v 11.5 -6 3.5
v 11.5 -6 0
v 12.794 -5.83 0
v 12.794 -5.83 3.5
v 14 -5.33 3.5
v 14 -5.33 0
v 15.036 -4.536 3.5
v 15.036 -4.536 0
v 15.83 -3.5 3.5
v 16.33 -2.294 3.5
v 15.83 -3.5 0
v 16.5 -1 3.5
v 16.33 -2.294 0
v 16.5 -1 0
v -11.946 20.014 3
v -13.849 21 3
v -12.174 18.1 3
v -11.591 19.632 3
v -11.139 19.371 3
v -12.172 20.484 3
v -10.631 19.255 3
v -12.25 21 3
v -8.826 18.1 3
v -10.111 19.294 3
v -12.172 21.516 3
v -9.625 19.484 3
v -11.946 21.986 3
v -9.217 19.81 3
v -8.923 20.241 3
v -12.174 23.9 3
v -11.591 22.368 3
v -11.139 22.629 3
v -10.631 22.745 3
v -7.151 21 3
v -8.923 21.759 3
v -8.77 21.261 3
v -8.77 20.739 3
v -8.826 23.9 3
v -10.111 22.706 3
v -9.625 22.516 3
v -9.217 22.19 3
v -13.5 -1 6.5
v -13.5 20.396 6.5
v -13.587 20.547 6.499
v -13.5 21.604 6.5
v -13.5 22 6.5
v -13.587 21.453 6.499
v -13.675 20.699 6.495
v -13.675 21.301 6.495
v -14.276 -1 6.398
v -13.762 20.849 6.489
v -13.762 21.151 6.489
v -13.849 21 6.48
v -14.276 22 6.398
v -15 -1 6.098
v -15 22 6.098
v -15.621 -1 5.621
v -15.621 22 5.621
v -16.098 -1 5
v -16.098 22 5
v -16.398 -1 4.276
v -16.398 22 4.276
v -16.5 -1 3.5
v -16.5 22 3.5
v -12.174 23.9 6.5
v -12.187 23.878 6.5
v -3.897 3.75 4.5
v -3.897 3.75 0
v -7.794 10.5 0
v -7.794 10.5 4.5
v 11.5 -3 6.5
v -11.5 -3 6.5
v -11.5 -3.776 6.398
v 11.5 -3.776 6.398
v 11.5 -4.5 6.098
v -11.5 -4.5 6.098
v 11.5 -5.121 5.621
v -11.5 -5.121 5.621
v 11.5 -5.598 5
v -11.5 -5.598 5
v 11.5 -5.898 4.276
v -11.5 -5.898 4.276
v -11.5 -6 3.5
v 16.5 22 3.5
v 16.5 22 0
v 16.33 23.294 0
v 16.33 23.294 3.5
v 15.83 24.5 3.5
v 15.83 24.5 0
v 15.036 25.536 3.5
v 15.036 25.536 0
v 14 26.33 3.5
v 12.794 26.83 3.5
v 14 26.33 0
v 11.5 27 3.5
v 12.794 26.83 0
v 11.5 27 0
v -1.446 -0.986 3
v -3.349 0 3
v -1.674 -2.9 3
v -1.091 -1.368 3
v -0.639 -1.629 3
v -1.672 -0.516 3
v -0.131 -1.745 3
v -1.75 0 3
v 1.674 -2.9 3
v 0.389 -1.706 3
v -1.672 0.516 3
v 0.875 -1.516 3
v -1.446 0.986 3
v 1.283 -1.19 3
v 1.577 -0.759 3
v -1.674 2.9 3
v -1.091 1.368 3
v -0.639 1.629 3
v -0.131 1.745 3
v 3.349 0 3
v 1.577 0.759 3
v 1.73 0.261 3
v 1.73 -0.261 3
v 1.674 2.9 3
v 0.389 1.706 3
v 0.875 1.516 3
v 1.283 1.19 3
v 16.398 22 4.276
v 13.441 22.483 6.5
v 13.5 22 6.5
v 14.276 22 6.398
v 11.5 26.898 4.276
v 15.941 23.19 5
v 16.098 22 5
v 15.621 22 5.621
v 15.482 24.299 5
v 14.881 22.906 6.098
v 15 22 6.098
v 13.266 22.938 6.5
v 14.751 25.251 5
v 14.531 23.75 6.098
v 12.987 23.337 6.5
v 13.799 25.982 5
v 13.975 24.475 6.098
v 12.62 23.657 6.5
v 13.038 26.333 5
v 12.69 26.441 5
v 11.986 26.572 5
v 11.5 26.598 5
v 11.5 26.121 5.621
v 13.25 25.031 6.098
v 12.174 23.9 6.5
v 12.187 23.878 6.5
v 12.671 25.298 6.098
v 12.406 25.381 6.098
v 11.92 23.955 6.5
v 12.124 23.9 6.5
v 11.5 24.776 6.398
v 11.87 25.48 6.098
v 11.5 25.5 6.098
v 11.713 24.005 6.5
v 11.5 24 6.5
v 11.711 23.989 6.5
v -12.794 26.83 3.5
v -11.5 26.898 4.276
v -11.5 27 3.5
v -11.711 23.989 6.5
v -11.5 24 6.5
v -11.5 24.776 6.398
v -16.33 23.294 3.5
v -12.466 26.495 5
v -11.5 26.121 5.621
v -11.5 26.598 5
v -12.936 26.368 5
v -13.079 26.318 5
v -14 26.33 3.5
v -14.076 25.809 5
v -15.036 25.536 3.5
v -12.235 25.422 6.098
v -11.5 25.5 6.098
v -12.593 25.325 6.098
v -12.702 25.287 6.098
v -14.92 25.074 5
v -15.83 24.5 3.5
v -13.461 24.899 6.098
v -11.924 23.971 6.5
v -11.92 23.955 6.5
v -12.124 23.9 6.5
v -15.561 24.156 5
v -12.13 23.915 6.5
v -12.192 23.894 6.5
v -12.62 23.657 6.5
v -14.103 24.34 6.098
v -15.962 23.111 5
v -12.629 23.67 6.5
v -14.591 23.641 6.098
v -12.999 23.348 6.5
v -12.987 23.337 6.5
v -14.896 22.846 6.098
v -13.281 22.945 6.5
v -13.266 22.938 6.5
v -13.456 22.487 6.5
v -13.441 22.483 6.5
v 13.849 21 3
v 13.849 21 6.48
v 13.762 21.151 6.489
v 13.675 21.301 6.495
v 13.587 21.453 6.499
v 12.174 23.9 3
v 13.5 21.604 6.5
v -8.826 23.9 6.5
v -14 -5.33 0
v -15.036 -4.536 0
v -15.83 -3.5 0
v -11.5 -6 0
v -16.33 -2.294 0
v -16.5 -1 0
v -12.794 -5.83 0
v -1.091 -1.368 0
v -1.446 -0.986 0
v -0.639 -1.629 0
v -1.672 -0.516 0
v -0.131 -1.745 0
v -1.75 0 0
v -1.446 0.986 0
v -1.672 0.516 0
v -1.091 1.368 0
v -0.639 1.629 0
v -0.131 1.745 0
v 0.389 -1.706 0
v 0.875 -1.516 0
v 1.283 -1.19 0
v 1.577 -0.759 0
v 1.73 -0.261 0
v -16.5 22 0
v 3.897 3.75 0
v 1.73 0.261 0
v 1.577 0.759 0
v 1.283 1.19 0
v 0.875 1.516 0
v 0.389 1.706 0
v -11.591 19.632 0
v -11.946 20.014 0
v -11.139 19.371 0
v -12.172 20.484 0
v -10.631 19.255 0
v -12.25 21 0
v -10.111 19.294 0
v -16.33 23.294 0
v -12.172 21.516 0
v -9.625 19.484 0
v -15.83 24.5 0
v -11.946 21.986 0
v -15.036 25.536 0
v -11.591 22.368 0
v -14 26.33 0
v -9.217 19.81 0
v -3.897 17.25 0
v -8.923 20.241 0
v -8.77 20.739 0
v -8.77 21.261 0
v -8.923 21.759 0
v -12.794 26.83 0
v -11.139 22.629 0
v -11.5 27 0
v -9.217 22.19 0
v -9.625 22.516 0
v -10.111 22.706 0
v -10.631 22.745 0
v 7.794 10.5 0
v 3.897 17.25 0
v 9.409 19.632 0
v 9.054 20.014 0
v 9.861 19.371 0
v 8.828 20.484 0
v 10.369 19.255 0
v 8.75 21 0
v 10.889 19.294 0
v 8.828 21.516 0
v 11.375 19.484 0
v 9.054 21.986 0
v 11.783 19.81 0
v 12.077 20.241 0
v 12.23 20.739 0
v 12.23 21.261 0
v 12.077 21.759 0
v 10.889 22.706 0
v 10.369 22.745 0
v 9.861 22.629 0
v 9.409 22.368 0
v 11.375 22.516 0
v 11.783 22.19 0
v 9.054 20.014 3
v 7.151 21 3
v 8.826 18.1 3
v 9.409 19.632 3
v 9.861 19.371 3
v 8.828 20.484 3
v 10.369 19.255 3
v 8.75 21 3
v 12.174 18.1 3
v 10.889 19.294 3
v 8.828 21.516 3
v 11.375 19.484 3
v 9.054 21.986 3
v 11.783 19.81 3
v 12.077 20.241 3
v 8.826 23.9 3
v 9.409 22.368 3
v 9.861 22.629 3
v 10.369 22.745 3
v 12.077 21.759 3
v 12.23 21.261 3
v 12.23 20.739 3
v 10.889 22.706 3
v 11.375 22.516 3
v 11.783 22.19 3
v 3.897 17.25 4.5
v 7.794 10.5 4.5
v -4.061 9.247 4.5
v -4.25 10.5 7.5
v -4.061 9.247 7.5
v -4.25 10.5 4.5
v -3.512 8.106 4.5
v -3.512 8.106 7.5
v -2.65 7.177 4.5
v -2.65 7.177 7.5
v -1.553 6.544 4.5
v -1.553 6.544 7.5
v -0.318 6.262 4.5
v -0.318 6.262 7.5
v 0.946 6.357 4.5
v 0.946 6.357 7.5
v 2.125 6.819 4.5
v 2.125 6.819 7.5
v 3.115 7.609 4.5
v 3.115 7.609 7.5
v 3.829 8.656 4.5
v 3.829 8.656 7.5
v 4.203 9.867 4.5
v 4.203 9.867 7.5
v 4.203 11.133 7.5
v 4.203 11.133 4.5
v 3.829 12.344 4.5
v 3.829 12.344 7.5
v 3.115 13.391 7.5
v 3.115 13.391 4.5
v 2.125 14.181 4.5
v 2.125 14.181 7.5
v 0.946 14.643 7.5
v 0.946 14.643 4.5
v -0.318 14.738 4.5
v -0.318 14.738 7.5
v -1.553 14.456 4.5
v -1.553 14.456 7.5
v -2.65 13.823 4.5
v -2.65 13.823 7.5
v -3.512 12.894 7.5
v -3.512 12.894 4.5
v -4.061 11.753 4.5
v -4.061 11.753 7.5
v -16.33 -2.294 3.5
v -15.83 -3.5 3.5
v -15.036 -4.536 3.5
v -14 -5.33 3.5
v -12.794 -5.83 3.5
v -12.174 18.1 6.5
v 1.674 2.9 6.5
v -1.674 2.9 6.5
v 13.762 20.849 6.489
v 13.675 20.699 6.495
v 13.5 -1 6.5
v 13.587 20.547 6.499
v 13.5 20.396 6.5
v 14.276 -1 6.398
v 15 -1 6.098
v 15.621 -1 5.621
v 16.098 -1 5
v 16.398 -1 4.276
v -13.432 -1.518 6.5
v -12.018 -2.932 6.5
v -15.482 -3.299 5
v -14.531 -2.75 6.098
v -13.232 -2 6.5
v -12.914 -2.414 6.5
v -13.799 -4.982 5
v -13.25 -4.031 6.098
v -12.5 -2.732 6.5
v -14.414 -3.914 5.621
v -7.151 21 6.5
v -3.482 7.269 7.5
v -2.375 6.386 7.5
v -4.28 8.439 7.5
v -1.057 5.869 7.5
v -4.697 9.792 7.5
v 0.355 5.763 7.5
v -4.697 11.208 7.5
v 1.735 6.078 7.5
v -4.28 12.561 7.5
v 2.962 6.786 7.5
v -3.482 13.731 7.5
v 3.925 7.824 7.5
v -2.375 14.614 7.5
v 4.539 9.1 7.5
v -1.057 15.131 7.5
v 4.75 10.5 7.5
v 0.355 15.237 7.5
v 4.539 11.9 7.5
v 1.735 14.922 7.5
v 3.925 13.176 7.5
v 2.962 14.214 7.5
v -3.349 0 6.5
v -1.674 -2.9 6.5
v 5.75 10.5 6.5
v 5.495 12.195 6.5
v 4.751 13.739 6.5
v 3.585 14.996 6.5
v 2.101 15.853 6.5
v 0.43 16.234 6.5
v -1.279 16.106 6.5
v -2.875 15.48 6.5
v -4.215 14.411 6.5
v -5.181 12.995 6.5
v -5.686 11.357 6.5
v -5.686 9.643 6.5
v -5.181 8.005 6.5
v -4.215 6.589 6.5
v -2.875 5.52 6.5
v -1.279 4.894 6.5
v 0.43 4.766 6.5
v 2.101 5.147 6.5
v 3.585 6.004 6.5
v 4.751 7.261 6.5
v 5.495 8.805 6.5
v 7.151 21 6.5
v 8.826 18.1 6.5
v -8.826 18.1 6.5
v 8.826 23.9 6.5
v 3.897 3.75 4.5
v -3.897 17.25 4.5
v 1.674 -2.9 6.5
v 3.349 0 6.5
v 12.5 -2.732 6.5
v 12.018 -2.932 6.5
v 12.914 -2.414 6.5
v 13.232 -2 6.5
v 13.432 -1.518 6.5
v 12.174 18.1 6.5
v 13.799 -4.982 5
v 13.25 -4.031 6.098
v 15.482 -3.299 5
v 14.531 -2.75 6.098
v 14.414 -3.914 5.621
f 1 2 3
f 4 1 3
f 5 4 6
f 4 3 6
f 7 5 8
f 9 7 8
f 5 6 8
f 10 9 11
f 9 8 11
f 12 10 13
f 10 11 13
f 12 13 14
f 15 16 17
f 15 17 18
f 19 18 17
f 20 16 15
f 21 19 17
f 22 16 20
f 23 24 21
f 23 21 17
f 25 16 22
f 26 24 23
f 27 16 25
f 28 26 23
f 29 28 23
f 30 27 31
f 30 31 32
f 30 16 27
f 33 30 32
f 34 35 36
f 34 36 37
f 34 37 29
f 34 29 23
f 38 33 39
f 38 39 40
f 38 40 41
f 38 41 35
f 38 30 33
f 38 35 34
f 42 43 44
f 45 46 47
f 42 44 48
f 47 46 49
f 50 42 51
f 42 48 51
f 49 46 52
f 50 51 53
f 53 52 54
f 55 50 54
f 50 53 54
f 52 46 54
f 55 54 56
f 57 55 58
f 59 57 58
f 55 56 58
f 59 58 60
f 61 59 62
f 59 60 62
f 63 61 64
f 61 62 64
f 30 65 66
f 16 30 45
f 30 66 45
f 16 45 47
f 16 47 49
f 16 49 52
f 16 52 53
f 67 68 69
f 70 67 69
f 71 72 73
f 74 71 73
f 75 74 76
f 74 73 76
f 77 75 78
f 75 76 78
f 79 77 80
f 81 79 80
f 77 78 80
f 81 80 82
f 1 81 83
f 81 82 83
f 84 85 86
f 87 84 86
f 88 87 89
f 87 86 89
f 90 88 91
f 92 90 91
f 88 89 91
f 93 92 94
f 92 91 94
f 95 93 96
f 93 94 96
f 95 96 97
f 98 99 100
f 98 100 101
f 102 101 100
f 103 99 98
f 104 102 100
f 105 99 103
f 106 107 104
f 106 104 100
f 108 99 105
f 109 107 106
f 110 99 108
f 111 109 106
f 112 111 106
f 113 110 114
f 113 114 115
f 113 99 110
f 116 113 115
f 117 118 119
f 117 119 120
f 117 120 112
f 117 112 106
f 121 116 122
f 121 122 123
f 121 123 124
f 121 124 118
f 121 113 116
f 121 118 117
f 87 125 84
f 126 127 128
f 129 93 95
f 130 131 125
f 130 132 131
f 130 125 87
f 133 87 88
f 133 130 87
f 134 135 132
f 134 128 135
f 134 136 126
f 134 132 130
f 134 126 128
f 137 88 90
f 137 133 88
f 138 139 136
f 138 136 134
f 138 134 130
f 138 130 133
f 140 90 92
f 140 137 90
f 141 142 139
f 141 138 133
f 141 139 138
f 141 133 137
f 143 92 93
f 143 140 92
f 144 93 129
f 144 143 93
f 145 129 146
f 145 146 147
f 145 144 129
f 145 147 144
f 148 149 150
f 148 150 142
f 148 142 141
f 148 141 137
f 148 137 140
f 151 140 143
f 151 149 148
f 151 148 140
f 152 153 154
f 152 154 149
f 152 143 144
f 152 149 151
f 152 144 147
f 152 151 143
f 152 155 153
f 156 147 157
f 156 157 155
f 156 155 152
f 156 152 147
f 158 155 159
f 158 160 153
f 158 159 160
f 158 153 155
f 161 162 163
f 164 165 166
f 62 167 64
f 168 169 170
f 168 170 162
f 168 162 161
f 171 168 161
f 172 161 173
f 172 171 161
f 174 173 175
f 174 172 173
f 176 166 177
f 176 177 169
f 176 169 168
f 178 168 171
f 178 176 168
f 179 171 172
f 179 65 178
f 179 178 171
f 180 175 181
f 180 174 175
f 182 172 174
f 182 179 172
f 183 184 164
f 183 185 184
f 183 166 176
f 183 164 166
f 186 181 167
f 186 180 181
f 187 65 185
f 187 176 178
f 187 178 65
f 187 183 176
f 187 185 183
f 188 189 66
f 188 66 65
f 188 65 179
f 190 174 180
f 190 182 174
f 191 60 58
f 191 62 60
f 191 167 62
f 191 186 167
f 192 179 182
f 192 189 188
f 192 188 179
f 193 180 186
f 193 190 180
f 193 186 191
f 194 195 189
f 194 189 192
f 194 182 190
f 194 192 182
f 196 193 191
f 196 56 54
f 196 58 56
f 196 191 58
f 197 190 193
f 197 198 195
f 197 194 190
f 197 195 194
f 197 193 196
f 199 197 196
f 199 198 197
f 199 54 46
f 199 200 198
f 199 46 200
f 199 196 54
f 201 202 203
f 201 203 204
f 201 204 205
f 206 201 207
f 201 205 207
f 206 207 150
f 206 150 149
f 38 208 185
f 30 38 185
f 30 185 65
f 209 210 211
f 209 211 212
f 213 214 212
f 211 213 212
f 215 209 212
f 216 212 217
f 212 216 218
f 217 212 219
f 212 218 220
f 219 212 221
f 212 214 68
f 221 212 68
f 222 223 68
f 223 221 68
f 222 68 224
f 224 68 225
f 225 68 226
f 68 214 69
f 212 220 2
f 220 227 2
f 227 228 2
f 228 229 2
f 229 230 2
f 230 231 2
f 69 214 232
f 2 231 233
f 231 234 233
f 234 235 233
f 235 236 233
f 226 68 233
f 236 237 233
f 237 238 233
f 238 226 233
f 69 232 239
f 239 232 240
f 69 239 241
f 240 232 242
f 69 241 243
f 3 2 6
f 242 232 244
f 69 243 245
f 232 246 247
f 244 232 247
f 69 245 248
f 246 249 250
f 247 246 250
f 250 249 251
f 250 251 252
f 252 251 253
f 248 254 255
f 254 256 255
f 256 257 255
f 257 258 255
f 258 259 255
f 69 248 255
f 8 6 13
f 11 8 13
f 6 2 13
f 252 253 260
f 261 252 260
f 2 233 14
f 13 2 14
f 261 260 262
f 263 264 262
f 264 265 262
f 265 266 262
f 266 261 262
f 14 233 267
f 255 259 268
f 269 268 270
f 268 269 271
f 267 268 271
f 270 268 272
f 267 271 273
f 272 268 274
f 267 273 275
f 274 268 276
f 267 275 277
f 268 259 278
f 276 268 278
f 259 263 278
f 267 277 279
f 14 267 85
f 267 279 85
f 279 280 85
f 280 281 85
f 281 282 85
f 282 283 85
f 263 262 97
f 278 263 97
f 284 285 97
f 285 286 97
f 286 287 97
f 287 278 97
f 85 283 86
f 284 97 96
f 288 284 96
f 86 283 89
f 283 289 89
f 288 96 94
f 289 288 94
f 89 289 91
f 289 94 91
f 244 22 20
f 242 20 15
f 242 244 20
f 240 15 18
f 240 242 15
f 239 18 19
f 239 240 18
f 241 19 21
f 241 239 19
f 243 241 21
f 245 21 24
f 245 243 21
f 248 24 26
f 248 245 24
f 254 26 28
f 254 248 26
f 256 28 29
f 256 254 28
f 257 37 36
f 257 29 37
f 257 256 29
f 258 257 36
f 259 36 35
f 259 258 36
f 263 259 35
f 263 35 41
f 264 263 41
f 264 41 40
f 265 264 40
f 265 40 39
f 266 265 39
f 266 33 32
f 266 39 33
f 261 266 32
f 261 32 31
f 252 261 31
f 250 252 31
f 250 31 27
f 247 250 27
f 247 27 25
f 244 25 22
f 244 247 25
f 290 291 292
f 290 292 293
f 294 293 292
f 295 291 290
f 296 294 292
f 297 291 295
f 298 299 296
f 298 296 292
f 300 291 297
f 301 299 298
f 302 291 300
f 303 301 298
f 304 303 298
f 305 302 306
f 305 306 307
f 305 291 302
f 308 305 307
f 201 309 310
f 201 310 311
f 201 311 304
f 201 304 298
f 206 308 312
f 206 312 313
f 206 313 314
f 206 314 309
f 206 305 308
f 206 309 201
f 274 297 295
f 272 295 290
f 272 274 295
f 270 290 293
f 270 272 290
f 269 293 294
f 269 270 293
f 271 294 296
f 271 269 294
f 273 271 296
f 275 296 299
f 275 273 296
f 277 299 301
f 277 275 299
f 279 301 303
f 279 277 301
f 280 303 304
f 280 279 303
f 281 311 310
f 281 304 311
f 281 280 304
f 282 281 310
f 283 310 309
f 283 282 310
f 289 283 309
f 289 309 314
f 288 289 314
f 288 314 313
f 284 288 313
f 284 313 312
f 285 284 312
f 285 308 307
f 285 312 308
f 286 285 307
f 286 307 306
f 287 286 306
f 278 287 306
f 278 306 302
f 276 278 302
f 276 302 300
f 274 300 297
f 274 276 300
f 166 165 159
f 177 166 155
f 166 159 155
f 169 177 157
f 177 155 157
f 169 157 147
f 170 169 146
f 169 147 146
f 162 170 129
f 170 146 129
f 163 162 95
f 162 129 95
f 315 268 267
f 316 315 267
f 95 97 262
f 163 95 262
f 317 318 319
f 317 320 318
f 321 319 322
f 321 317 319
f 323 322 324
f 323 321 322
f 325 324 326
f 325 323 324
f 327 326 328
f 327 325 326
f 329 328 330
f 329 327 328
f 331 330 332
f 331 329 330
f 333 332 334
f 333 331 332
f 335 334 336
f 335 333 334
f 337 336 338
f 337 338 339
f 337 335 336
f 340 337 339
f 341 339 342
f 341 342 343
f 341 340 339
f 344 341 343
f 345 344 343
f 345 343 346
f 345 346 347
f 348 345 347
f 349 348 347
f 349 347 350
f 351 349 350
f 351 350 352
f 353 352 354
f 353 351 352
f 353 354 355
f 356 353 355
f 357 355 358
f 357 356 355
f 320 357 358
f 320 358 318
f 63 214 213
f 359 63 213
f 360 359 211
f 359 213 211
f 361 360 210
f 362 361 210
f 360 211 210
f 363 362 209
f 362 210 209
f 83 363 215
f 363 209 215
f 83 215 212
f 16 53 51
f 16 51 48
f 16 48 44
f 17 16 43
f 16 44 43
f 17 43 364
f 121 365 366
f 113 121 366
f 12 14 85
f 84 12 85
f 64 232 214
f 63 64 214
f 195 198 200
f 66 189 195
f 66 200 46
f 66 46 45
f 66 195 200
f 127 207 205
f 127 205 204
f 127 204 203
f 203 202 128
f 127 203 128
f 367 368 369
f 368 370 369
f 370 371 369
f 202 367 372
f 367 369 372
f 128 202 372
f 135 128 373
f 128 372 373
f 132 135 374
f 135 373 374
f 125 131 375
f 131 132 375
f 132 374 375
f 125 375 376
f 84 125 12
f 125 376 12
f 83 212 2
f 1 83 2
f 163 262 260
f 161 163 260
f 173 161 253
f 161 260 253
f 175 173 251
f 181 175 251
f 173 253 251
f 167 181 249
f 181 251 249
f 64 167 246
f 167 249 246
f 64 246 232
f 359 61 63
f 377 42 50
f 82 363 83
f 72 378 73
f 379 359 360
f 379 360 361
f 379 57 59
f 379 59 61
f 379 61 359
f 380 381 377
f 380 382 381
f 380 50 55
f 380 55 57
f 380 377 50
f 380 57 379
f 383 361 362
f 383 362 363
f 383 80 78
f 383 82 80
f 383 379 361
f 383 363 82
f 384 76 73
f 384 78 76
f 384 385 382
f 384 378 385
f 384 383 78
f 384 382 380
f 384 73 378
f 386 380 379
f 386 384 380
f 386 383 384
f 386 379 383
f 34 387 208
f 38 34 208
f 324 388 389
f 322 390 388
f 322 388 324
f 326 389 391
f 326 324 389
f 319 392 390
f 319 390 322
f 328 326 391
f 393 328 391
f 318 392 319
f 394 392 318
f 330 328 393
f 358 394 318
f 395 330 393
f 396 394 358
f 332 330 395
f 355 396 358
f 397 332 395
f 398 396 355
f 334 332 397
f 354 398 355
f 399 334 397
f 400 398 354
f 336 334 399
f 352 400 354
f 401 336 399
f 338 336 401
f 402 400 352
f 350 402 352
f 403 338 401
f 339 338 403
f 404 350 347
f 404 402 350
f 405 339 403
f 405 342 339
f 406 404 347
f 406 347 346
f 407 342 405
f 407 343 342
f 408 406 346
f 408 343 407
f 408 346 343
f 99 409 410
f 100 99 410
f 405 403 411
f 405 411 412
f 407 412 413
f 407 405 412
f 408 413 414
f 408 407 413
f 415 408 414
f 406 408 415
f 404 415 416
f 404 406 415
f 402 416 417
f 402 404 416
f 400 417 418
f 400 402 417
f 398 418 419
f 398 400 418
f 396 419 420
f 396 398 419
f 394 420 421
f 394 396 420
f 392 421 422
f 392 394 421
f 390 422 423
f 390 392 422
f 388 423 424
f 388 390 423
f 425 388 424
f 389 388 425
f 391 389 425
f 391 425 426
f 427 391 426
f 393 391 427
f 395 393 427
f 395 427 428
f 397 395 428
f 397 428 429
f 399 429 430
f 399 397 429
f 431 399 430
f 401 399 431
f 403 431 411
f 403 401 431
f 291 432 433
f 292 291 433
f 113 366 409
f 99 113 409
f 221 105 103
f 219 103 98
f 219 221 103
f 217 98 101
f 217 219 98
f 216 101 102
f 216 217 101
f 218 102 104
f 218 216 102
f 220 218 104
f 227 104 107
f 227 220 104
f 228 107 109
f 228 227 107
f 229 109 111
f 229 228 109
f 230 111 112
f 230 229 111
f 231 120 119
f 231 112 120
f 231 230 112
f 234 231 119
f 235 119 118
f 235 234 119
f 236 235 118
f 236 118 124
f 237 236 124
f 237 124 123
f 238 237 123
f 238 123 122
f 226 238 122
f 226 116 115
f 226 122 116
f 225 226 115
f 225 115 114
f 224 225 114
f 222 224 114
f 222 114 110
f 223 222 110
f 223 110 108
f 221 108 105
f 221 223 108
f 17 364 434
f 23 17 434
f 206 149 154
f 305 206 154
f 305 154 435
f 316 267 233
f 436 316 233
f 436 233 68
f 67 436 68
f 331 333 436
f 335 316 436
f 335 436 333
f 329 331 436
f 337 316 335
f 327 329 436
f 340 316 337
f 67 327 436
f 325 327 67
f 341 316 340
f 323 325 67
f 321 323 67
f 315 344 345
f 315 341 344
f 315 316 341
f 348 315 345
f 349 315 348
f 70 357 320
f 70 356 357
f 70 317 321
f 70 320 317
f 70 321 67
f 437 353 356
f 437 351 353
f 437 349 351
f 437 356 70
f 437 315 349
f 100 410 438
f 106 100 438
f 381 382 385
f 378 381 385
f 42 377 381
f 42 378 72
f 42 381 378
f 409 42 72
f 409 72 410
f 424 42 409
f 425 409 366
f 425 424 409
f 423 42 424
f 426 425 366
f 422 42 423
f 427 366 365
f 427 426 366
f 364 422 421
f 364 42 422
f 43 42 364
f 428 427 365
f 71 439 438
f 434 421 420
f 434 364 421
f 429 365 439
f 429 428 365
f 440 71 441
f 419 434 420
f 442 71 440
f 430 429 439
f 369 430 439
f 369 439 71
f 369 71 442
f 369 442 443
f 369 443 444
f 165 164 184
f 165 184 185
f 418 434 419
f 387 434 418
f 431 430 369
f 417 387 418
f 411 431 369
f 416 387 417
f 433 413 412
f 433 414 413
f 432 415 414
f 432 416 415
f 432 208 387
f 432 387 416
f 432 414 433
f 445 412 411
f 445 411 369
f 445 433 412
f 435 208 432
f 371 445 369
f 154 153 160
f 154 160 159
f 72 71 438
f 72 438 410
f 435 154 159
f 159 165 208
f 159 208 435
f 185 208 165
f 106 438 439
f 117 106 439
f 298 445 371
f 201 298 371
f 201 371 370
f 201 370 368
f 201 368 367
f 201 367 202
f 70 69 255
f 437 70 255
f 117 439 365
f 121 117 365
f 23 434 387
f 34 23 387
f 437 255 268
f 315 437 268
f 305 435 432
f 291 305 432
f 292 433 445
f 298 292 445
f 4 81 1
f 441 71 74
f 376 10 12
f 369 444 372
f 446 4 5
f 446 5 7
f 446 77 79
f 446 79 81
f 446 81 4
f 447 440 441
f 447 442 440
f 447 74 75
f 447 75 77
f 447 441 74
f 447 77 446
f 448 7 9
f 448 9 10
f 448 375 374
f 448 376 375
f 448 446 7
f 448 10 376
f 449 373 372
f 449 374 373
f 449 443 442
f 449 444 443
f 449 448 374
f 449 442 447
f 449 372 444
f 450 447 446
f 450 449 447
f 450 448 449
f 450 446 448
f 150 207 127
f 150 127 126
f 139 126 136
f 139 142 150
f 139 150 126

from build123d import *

# Parameters (mm, degrees)
ESBO_O1_R                = 1.75
RESSALTO_EXTRUS_O1_DEPTH = 6.5
CORTE_EXTRUS_O1_DEPTH    = 3.5
CORTE_EXTRUS_O2_DEPTH    = 4.5
ESBO_O3_3_R              = 4.25
CORTE_EXTRUS_O3_DEPTH    = 33.30325061
ESBO_O4_R                = 5.75
ESBO_O4_R_2              = 4.25
RESSALTO_EXTRUS_O2_DEPTH = 1
CHANFRO1_SIZE            = 1
FILETE1_R                = 3


# Some blends are built 0.0001 mm under size
with BuildPart() as part:
    # Esboço1 → Ressalto-extrusão1 (new body)
    with BuildSketch(Plane.XY):
        with BuildLine():
            Line((-11.5, -6), (11.5, -6))
            ThreePointArc((11.5, -6), (15.035533906, -4.535533906), (16.5, -1))
            Line((16.5, -1), (16.5, 22))
            ThreePointArc((16.5, 22), (15.035533906, 25.535533906), (11.5, 27))
            Line((11.5, 27), (-11.5, 27))
            ThreePointArc((-11.5, 27), (-15.035533906, 25.535533906), (-16.5, 22))
            Line((-16.5, 22), (-16.5, -1))
            ThreePointArc((-16.5, -1), (-15.035533906, -4.535533906), (-11.5, -6))
        make_face()
        with Locations(Location((0, 0, 0), (0, 0, 180))):
            Circle(ESBO_O1_R, mode=Mode.SUBTRACT)
        with Locations(Location((-10.5, 21, 0), (0, 0, 180))):
            Circle(ESBO_O1_R, mode=Mode.SUBTRACT)
        with Locations(Location((10.5, 21, 0), (0, 0, 180))):
            Circle(ESBO_O1_R, mode=Mode.SUBTRACT)
    extrude(amount=RESSALTO_EXTRUS_O1_DEPTH)

    # Esboço2 → Corte-extrusão1 (cut)
    with BuildSketch(Plane.XY.offset(6.5)):
        Polygon((-12.174315781, 18.1), (-8.825684219, 18.1), (-7.151368439, 21), (-8.825684219, 23.9), (-12.174315781, 23.9), (-13.848631561, 21), align=None)
        Polygon((8.825684219, 18.1), (12.174315781, 18.1), (13.848631561, 21), (12.174315781, 23.9), (8.825684219, 23.9), (7.151368439, 21), align=None)
        Polygon((-1.674315781, 2.9), (-3.348631561, 0), (-1.674315781, -2.9), (1.674315781, -2.9), (3.348631561, 0), (1.674315781, 2.9), align=None)
    extrude(amount=-CORTE_EXTRUS_O1_DEPTH, mode=Mode.SUBTRACT)

    # Esboço3 → Corte-extrusão2 (cut)
    with BuildSketch(Plane(origin=(0, 0, 0), x_dir=(-1, 0, 0), z_dir=(0, 0, -1))):
        Polygon((3.897114317, 17.25), (-3.897114317, 17.25), (-7.794228634, 10.5), (-3.897114317, 3.75), (3.897114317, 3.75), (7.794228634, 10.5), align=None)
    extrude(amount=-CORTE_EXTRUS_O2_DEPTH, mode=Mode.SUBTRACT)

    # Esboço3<3> → Corte-extrusão3 (cut, through all)
    with BuildSketch(Plane(origin=(0, 0, 0), x_dir=(-1, 0, 0), z_dir=(0, 0, -1))):
        with Locations((0, 10.5)):
            Circle(ESBO_O3_3_R)
    extrude(amount=-CORTE_EXTRUS_O3_DEPTH, mode=Mode.SUBTRACT)

    # Esboço4 → Ressalto-extrusão2 (add)
    with BuildSketch(Plane.XY.offset(6.5)):
        with Locations((0, 10.5)):
            Circle(ESBO_O4_R)
        with Locations(Location((0, 10.5, 0), (0, 0, 180))):
            Circle(ESBO_O4_R_2, mode=Mode.SUBTRACT)
    extrude(amount=RESSALTO_EXTRUS_O2_DEPTH)

    # Chanfro1
    chanfro1_edges = [part.edges().sort_by_distance(p)[0] for p in [
        (-5.75, 10.5, 7.5),
    ]]
    chamfer(chanfro1_edges, length=CHANFRO1_SIZE - 0.0001)  # a hair under: the kernel refuses the full size

    # Filete1
    # the kernel refuses this fillet: 3 mm, written as the material it takes off along each edge
    with BuildSketch(Plane(origin=(11.5, 22, 6.5), x_dir=(1, 0, 0), z_dir=(0, -1, 0))) as filete1_piece_1:
        with BuildLine():
            CenterArc((5 - FILETE1_R, -FILETE1_R), FILETE1_R, 0, 90)
            Line((5, -FILETE1_R), (5, 0))
            Line((5, 0), (5 - FILETE1_R, 0))
        make_face()
    revolve(axis=Axis((11.5, 22, 6.5), (0, 0, 1)), revolution_arc=90, mode=Mode.SUBTRACT)
    with BuildSketch(Plane(origin=(11.5, 27, 6.5), x_dir=(0, -1, 0), z_dir=(-1, 0, 0)), Plane(origin=(-16.5, 22, 6.5), x_dir=(1, 0, 0), z_dir=(0, -1, 0)), Plane(origin=(-11.5, -6, 6.5), x_dir=(0, 1, 0), z_dir=(1, 0, 0)), Plane(origin=(16.5, -1, 6.5), x_dir=(-1, 0, 0), z_dir=(0, 1, 0))) as filete1_piece_2:
        with BuildLine():
            CenterArc((FILETE1_R, -FILETE1_R), FILETE1_R, 90, 90)
            Line((0, -FILETE1_R), (0, 0))
            Line((0, 0), (FILETE1_R, 0))
        make_face()
    extrude(amount=23, mode=Mode.SUBTRACT)
    with BuildSketch(Plane(origin=(-11.5, 22, 6.5), x_dir=(0, 1, 0), z_dir=(1, 0, 0))) as filete1_piece_3:
        with BuildLine():
            CenterArc((5 - FILETE1_R, -FILETE1_R), FILETE1_R, 0, 90)
            Line((5, -FILETE1_R), (5, 0))
            Line((5, 0), (5 - FILETE1_R, 0))
        make_face()
    revolve(axis=Axis((-11.5, 22, 6.5), (0, 0, 1)), revolution_arc=90, mode=Mode.SUBTRACT)
    with BuildSketch(Plane(origin=(-11.5, -1, 6.5), x_dir=(-1, 0, 0), z_dir=(0, 1, 0))) as filete1_piece_4:
        with BuildLine():
            CenterArc((5 - FILETE1_R, -FILETE1_R), FILETE1_R, 0, 90)
            Line((5, -FILETE1_R), (5, 0))
            Line((5, 0), (5 - FILETE1_R, 0))
        make_face()
    revolve(axis=Axis((-11.5, -1, 6.5), (0, 0, 1)), revolution_arc=90, mode=Mode.SUBTRACT)
    with BuildSketch(Plane(origin=(11.5, -1, 6.5), x_dir=(0, -1, 0), z_dir=(-1, 0, 0))) as filete1_piece_5:
        with BuildLine():
            CenterArc((5 - FILETE1_R, -FILETE1_R), FILETE1_R, 0, 90)
            Line((5, -FILETE1_R), (5, 0))
            Line((5, 0), (5 - FILETE1_R, 0))
        make_face()
    revolve(axis=Axis((11.5, -1, 6.5), (0, 0, 1)), revolution_arc=90, mode=Mode.SUBTRACT)


solid = part.part
